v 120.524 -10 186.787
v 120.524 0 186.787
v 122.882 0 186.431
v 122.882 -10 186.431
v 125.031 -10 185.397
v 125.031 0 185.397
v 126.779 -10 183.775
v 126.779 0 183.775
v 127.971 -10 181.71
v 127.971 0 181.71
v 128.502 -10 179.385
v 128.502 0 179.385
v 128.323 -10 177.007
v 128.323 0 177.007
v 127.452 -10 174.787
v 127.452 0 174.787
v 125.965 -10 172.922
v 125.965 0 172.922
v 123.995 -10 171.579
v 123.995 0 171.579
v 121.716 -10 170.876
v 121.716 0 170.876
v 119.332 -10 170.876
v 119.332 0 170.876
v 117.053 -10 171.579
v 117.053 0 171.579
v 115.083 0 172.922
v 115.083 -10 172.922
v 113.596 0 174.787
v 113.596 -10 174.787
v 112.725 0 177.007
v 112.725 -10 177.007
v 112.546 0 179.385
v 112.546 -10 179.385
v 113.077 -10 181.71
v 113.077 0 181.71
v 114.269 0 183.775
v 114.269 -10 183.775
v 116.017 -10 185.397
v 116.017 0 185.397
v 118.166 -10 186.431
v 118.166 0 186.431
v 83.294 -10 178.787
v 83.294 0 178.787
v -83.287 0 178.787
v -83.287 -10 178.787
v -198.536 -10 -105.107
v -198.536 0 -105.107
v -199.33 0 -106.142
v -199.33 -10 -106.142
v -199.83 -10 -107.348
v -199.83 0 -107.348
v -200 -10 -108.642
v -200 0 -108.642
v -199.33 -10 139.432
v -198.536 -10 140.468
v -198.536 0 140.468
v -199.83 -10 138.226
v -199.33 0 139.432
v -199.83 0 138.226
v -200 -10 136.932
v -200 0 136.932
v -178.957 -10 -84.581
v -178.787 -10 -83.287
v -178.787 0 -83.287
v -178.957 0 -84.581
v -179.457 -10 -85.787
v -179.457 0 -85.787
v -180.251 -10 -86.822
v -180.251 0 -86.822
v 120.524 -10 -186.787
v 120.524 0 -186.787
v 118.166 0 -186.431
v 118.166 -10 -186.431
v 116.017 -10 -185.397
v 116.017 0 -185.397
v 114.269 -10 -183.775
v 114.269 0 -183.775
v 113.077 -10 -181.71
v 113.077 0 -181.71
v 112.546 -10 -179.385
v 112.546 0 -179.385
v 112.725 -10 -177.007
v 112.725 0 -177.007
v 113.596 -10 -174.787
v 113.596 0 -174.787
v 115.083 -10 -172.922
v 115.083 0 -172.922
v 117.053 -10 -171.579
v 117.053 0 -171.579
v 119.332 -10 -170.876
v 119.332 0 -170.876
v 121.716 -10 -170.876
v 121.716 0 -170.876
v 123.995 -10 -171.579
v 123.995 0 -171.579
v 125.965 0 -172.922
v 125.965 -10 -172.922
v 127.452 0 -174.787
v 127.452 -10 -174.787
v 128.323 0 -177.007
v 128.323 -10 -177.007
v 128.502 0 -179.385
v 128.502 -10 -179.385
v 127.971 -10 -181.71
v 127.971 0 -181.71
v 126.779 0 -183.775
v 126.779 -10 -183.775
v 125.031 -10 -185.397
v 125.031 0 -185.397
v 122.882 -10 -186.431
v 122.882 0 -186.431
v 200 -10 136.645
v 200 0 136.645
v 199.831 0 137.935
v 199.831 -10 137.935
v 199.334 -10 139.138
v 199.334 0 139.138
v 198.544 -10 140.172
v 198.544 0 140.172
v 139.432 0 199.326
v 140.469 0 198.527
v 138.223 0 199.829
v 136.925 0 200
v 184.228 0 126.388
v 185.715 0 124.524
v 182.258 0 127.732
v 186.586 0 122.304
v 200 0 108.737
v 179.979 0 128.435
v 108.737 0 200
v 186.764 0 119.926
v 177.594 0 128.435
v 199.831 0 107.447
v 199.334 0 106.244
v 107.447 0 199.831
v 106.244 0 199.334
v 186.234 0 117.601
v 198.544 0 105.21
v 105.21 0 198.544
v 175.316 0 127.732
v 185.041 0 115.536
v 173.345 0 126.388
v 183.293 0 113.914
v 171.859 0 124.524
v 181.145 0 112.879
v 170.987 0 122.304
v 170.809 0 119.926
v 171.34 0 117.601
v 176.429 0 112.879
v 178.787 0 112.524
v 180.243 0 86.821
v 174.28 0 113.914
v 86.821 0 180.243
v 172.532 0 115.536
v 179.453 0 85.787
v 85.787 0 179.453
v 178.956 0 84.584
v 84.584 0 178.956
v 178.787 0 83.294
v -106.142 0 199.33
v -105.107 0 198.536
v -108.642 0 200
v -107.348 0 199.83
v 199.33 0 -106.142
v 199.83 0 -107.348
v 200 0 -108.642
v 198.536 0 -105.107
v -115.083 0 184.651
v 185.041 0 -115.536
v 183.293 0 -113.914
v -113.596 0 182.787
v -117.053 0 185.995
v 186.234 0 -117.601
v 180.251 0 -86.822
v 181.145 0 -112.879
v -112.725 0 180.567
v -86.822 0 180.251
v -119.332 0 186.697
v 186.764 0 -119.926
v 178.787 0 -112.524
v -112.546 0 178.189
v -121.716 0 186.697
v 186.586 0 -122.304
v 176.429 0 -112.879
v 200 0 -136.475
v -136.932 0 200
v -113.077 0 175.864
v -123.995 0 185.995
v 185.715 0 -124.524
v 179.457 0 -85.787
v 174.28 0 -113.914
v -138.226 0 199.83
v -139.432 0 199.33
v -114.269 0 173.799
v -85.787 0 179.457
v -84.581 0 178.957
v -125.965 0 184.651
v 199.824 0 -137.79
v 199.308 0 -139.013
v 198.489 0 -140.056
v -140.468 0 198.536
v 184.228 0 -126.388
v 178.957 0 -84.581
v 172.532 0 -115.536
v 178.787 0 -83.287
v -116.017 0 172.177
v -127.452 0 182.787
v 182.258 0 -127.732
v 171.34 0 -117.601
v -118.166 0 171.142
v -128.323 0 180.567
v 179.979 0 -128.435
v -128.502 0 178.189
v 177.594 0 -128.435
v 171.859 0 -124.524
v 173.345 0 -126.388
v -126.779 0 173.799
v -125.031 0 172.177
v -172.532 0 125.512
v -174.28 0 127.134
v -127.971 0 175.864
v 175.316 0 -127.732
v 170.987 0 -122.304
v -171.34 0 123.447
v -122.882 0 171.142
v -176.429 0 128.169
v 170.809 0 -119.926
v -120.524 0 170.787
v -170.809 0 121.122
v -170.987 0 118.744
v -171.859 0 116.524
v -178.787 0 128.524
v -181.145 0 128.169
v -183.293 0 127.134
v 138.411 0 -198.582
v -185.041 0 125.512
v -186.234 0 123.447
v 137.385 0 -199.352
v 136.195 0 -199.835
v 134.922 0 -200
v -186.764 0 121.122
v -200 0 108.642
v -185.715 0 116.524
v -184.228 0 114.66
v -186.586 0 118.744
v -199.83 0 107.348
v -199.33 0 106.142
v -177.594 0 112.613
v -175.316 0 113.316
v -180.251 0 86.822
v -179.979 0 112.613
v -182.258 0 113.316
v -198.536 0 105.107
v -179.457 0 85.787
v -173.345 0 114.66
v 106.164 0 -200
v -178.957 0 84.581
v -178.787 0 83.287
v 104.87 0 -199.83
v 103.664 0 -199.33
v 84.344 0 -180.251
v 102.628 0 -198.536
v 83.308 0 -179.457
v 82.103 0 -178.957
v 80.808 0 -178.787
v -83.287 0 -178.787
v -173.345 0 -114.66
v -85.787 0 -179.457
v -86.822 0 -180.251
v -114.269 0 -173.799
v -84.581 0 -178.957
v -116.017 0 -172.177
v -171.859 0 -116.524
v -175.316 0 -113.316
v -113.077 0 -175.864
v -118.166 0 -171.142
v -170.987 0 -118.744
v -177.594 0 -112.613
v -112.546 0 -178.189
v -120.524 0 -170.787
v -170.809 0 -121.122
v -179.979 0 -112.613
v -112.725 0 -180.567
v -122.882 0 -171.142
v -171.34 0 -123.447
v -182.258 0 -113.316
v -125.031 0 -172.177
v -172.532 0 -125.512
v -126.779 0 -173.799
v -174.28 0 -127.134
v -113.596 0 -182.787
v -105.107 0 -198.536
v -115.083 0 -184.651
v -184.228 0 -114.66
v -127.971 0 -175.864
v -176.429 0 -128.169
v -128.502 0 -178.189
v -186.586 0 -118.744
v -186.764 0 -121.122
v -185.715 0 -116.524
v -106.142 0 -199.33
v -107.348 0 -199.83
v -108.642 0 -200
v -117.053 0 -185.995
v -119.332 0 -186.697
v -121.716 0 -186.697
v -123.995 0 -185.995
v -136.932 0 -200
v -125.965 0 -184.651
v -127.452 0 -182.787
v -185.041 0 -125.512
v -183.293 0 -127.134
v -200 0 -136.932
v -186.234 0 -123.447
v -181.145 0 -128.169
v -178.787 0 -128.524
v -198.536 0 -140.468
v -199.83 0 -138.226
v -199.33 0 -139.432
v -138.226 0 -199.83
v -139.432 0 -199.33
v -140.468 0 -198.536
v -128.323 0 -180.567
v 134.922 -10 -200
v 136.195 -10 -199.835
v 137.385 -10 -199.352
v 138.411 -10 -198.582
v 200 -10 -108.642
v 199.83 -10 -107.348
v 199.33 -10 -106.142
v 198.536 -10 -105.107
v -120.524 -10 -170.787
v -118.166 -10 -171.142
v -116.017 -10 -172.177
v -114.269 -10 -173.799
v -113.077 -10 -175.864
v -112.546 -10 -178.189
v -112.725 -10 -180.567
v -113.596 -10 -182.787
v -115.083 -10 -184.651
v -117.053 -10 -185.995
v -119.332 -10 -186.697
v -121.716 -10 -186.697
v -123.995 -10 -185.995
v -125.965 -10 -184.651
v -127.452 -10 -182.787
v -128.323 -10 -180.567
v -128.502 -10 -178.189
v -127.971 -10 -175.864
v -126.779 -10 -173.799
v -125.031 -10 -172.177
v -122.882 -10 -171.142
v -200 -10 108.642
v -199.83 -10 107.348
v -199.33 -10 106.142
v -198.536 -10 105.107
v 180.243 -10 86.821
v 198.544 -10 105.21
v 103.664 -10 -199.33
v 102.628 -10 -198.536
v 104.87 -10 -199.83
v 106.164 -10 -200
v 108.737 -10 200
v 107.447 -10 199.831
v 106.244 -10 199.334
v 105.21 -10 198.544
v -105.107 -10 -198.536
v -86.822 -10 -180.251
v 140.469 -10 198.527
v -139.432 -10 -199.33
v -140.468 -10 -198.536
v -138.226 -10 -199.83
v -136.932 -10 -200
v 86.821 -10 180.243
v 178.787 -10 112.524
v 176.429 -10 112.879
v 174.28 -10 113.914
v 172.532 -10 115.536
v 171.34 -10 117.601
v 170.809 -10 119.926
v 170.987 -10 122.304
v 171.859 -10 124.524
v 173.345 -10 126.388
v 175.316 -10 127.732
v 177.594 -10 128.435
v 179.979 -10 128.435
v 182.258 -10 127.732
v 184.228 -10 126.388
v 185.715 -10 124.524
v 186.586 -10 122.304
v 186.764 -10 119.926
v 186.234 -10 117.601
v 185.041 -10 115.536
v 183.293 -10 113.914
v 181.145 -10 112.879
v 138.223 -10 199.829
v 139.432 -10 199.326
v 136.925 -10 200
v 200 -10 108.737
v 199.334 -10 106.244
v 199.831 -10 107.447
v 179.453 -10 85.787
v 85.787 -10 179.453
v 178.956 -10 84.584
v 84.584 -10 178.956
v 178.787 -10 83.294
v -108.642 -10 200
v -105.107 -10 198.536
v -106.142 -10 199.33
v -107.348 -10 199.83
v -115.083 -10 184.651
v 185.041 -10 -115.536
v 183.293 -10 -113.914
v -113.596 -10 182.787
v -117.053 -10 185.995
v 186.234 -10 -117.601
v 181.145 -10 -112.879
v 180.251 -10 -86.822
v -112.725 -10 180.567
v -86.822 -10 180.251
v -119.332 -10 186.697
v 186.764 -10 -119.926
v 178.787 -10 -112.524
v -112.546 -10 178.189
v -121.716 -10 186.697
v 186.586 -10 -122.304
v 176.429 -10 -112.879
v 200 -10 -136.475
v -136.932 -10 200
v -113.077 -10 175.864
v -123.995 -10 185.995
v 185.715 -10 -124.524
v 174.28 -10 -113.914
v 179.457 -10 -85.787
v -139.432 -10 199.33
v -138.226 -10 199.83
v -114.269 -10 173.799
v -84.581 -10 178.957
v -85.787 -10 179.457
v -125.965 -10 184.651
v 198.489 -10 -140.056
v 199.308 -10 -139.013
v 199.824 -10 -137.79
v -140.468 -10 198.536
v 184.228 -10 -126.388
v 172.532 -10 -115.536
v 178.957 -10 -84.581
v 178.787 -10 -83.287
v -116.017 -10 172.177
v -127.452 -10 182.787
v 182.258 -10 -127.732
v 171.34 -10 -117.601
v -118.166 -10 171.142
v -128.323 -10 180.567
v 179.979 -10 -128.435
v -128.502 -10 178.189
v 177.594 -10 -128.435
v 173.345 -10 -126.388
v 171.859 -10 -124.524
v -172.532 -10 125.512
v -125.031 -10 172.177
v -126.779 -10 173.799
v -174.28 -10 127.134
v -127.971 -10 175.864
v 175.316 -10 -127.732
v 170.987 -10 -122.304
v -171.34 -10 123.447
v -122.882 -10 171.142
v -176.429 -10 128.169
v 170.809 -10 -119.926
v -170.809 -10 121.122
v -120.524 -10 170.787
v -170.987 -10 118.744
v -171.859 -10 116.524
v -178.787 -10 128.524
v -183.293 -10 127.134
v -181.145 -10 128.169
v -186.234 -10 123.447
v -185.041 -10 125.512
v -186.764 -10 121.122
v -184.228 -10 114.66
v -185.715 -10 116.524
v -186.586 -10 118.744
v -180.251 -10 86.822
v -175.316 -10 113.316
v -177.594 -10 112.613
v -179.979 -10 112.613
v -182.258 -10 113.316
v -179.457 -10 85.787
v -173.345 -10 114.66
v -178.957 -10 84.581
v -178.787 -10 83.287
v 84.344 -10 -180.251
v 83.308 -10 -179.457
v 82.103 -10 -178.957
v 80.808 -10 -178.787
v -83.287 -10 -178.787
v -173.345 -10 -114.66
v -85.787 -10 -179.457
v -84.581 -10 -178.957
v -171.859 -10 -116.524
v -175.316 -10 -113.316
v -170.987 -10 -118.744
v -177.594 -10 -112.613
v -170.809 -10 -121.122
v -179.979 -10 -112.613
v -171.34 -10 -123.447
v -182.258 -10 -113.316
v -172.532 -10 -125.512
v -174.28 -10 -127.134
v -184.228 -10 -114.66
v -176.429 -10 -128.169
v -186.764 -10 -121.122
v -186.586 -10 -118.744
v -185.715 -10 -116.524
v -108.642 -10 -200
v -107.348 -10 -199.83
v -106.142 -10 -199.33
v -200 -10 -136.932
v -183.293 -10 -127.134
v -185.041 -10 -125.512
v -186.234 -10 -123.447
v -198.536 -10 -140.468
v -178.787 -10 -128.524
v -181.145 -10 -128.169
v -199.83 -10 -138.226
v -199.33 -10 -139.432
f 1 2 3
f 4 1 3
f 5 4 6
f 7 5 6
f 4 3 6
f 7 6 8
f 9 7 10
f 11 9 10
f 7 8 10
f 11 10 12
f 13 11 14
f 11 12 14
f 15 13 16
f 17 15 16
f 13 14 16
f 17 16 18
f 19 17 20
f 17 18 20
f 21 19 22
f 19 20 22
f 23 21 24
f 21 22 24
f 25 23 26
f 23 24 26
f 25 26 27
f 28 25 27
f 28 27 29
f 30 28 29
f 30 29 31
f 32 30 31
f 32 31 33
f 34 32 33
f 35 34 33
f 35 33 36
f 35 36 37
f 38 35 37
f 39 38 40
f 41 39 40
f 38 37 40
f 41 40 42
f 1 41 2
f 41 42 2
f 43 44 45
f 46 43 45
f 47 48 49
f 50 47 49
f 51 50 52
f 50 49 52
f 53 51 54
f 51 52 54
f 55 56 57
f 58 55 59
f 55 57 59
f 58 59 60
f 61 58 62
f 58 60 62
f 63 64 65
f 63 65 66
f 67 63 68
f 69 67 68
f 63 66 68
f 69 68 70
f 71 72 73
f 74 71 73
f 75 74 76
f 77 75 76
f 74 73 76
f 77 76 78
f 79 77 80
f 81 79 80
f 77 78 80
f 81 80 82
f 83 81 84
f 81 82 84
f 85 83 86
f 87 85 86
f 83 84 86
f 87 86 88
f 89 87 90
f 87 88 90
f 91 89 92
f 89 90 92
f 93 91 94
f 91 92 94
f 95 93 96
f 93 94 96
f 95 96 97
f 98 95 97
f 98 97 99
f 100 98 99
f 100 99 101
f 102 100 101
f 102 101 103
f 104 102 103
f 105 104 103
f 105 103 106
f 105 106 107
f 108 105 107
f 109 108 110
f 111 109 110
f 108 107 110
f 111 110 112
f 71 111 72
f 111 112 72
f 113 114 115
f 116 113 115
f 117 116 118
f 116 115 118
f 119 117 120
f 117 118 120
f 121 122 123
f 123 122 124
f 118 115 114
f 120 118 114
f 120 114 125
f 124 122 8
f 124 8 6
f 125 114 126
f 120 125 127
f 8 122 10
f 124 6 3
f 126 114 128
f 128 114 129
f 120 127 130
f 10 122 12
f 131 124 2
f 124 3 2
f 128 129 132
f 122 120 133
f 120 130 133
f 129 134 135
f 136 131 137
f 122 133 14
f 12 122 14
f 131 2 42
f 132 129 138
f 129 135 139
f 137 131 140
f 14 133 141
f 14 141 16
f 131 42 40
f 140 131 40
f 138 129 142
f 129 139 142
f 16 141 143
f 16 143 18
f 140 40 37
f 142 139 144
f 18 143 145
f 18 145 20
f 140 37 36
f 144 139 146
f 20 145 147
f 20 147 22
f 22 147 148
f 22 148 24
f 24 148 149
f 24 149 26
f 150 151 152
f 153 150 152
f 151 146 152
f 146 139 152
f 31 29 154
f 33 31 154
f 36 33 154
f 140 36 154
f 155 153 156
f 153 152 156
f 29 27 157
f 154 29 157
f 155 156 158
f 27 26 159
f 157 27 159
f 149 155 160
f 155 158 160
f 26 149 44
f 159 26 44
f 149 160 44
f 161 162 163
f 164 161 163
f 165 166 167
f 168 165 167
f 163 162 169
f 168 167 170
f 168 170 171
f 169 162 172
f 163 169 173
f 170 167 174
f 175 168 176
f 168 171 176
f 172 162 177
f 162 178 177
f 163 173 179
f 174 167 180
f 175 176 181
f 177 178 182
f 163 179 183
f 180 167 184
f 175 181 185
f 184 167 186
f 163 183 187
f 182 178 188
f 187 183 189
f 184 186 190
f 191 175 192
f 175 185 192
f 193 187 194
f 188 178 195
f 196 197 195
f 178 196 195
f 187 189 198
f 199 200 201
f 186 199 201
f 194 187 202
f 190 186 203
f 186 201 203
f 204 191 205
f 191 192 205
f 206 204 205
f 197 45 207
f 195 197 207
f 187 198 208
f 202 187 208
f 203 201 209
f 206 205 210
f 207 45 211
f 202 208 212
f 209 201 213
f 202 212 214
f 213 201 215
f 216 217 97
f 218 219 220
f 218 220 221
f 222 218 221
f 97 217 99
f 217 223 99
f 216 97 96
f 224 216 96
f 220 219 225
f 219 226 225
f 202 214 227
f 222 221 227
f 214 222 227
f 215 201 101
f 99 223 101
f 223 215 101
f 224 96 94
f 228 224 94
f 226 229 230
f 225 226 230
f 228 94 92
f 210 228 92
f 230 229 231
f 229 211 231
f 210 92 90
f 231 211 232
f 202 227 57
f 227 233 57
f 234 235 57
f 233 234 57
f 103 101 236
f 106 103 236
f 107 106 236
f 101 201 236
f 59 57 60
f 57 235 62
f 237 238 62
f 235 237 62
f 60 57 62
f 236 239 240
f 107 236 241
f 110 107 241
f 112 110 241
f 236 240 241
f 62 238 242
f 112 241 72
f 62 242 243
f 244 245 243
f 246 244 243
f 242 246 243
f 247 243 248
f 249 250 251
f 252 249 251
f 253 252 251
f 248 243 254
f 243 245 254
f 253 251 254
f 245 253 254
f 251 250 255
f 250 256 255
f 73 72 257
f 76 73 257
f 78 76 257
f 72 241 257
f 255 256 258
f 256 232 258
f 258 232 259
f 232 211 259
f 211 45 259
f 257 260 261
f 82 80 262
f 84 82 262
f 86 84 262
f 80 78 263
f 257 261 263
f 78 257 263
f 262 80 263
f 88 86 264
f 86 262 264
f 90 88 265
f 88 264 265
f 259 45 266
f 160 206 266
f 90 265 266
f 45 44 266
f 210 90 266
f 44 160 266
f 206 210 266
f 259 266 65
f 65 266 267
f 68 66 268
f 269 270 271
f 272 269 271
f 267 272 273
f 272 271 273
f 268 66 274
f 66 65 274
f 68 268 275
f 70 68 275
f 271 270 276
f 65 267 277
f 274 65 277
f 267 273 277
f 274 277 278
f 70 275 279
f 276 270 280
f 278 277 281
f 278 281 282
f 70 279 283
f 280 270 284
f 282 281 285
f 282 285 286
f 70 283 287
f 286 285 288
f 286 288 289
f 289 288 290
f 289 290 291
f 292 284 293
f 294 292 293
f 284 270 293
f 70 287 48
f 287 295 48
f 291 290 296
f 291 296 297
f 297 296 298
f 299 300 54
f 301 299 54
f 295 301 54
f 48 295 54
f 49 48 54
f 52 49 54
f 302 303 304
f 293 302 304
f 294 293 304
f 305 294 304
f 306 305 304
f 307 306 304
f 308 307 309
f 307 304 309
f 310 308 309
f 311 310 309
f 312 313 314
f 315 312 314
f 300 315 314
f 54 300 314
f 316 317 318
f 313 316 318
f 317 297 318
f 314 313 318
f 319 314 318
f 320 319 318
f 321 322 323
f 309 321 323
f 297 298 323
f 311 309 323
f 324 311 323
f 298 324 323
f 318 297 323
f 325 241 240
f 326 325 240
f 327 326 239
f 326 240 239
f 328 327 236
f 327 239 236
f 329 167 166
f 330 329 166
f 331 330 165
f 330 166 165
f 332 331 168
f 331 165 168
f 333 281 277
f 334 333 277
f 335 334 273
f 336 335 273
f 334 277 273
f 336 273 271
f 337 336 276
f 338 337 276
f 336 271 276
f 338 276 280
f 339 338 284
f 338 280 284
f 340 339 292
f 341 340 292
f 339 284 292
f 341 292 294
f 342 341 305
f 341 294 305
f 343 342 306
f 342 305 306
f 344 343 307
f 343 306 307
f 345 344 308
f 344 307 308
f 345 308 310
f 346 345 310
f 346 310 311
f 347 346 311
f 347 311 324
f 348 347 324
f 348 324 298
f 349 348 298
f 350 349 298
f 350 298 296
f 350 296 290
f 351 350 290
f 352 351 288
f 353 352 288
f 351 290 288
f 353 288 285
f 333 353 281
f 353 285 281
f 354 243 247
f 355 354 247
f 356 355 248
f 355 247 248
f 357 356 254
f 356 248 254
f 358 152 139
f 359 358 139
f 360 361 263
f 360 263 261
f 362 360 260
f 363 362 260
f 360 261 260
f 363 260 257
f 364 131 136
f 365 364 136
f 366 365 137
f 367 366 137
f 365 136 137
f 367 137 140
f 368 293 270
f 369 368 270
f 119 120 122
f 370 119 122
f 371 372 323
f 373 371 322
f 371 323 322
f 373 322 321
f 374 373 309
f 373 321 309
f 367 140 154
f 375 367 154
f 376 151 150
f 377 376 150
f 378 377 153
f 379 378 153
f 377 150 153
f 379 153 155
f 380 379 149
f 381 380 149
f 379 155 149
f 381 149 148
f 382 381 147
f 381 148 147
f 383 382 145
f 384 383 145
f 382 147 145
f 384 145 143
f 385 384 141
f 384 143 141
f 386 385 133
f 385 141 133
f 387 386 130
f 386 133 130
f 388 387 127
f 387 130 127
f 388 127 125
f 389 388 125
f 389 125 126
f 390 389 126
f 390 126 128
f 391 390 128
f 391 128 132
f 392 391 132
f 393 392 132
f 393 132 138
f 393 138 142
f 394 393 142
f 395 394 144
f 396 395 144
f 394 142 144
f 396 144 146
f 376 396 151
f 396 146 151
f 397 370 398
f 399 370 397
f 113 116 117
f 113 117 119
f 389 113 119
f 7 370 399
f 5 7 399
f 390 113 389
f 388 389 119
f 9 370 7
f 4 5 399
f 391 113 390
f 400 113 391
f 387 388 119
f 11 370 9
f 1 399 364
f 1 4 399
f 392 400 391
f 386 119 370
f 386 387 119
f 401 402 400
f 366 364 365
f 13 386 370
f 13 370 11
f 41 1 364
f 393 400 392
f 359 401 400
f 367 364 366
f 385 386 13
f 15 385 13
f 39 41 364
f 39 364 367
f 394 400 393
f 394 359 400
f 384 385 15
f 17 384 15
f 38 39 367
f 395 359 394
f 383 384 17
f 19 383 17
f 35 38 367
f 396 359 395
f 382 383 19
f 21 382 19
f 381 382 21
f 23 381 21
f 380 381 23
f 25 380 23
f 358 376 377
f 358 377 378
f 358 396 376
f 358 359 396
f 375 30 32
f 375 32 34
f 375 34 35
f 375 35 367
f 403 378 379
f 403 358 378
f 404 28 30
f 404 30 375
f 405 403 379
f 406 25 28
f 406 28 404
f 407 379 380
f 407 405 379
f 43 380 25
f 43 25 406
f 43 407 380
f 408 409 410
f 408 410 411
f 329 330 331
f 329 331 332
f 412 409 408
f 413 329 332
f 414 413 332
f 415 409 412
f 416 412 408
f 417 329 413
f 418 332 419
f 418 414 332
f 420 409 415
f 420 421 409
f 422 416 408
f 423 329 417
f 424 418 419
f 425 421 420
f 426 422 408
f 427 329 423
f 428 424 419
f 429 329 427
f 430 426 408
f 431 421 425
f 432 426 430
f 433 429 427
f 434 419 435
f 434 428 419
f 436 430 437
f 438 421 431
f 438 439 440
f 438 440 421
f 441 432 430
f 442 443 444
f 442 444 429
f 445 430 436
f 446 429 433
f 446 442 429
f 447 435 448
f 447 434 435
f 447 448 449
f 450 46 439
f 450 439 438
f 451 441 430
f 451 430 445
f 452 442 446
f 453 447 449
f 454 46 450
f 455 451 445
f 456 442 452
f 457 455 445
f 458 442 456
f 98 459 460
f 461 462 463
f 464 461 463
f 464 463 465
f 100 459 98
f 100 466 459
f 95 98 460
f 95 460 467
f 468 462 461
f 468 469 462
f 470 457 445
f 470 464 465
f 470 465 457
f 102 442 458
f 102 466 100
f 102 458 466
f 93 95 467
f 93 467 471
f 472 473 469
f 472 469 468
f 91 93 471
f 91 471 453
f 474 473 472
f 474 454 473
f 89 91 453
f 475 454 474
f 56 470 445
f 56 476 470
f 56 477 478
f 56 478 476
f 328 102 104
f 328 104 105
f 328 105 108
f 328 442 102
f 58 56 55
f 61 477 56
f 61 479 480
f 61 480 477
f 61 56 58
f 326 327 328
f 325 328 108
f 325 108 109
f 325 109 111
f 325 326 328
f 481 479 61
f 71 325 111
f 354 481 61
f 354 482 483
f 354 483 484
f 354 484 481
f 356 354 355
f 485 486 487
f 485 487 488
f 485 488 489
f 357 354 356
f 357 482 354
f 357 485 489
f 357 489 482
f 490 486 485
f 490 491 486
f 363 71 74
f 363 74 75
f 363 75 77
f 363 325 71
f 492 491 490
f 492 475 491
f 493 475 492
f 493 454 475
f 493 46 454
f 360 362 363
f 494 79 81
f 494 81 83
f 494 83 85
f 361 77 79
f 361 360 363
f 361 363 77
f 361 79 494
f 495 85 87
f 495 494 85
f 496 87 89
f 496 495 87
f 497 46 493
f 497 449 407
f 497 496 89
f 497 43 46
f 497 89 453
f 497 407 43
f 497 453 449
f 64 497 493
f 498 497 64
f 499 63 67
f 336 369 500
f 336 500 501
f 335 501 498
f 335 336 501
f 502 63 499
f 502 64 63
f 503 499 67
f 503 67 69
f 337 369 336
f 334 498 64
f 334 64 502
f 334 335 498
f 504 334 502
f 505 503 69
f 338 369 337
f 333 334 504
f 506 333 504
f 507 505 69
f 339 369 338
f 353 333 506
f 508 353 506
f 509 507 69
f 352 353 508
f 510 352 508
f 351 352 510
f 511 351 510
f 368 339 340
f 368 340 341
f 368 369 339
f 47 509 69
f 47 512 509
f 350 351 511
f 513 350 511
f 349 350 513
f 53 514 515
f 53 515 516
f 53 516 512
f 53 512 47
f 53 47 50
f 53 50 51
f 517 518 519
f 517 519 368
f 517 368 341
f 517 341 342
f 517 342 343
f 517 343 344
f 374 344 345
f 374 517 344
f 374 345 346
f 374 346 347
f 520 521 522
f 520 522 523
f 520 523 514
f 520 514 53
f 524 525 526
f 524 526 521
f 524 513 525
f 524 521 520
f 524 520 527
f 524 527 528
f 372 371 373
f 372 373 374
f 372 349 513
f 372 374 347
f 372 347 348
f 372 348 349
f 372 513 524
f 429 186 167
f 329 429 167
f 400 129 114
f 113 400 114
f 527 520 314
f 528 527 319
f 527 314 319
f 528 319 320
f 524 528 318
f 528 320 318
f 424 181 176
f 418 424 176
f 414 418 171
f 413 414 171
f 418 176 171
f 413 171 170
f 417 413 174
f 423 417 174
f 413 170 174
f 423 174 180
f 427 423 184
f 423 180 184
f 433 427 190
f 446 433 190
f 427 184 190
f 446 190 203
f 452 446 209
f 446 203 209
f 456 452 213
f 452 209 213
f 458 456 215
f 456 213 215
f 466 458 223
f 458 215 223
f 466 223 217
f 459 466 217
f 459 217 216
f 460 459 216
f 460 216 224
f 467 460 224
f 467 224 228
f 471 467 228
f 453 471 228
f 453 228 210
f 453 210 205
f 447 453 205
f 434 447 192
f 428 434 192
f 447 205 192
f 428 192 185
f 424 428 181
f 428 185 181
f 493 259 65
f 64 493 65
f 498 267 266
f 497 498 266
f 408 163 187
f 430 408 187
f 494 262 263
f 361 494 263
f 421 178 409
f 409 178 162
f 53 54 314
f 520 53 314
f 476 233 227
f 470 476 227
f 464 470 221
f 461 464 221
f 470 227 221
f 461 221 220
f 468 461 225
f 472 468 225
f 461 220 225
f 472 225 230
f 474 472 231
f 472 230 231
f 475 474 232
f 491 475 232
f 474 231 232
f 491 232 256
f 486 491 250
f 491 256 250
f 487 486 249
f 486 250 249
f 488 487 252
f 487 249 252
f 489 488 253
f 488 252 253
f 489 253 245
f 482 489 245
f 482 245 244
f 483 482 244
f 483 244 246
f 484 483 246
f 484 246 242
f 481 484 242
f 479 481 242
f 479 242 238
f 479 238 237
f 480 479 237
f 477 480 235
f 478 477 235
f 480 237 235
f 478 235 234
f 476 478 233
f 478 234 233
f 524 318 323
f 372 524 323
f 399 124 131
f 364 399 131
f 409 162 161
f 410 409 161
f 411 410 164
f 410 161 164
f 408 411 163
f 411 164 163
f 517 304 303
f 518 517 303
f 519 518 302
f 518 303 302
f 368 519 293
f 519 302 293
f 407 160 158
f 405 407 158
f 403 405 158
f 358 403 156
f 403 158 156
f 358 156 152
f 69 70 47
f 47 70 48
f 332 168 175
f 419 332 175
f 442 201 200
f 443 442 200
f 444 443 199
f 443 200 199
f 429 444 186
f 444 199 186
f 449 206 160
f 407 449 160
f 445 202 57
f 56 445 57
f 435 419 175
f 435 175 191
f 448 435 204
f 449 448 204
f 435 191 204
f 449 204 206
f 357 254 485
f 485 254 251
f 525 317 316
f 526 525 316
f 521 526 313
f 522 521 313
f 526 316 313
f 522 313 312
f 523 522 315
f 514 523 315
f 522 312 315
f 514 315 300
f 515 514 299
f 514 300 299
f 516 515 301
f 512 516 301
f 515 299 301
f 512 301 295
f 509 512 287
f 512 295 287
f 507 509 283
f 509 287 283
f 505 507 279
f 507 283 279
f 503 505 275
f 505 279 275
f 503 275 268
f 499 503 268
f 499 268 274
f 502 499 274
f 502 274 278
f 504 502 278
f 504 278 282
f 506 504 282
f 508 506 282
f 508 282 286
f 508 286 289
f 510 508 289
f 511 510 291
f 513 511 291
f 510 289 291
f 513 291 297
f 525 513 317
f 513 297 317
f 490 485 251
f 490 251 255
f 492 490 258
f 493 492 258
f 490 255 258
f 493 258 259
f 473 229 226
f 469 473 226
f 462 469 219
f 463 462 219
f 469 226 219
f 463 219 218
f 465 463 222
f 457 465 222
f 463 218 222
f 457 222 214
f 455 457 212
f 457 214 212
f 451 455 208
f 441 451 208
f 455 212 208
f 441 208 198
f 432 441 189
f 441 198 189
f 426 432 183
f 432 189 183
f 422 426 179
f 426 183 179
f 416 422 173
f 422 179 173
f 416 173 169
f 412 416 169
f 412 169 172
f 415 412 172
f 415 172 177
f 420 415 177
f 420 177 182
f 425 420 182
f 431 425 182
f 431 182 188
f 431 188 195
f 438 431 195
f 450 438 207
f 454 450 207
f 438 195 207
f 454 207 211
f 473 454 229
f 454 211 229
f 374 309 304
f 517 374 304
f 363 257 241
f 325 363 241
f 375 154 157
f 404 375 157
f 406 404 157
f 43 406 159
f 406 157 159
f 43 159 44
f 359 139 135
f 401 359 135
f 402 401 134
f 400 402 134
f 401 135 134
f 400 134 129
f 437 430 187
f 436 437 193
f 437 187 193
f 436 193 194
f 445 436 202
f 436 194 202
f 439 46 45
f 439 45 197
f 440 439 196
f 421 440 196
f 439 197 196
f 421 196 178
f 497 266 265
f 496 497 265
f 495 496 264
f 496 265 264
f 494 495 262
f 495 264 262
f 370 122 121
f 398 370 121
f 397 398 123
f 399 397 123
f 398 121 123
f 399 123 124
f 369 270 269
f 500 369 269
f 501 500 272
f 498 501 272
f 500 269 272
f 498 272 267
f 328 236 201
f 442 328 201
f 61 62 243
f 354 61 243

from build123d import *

# Parameters (mm, degrees)
ESQUISSE1_R        = 8
BOSS_EXTRU_3_DEPTH = 10


with BuildPart() as part:
    # Esquisse1 → Boss.-Extru.3 (new body)
    with BuildSketch(Plane(origin=(0, 0, 0), x_dir=(1, 0, 0), z_dir=(0, 1, 0))):
        with BuildLine():
            Line((-198.535533906, 140.467889787), (-140.467889787, 198.535533906))
            ThreePointArc((-140.467889787, 198.535533906), (-138.845773043, 199.619397663), (-136.932355881, 200))
            Line((-136.932355881, 200), (-108.642059072, 200))
            ThreePointArc((-108.642059072, 200), (-106.728641911, 199.619397663), (-105.106525166, 198.535533906))
            Line((-105.106525166, 198.535533906), (-86.822253919, 180.251262659))
            ThreePointArc((-86.822253919, 180.251262659), (-85.200137175, 179.167398902), (-83.286720013, 178.786796564))
            Line((-83.286720013, 178.786796564), (80.808477816, 178.786796564))
            ThreePointArc((80.808477816, 178.786796564), (82.721894978, 179.167398902), (84.344011722, 180.251262659))
            Line((84.344011722, 180.251262659), (102.628282969, 198.535533906))
            ThreePointArc((102.628282969, 198.535533906), (104.250399713, 199.619397663), (106.163816875, 200))
            Line((106.163816875, 200), (134.922487193, 200))
            ThreePointArc((134.922487193, 200), (136.805633434, 199.631820402), (138.411445264, 198.581504094))
            Line((138.411445264, 198.581504094), (198.488958072, 140.056393487))
            ThreePointArc((198.488958072, 140.056393487), (199.606777092, 138.418495531), (200, 136.474889393))
            Line((200, 136.474889393), (200, 108.642059072))
            ThreePointArc((200, 108.642059072), (199.619397663, 106.728641911), (198.535533906, 105.106525167))
            Line((198.535533906, 105.106525167), (180.251262658, 86.822253919))
            ThreePointArc((180.251262658, 86.822253919), (179.167398902, 85.200137175), (178.786796564, 83.286720013))
            Line((178.786796564, 83.286720013), (178.786796564, -83.293766644))
            ThreePointArc((178.786796564, -83.293766644), (179.165099385, -85.201622818), (180.242762637, -86.820780044))
            Line((180.242762637, -86.820780044), (198.544033927, -105.210368915))
            ThreePointArc((198.544033927, -105.210368915), (199.621697179, -106.82952614), (200, -108.737382314))
            Line((200, -108.737382314), (200, -136.645047547))
            ThreePointArc((200, -136.645047547), (199.621697179, -138.552903722), (198.544033927, -140.172060947))
            Line((198.544033927, -140.172060947), (140.469336148, -198.5270134))
            ThreePointArc((140.469336148, -198.5270134), (138.844277599, -199.617091455), (136.925302221, -200))
            Line((136.925302221, -200), (108.737382314, -200))
            ThreePointArc((108.737382314, -200), (106.82952614, -199.621697179), (105.210368915, -198.544033927))
            Line((105.210368915, -198.544033927), (86.820780044, -180.242762637))
            ThreePointArc((86.820780044, -180.242762637), (85.201622818, -179.165099385), (83.293766644, -178.786796564))
            Line((83.293766644, -178.786796564), (-83.286720013, -178.786796564))
            ThreePointArc((-83.286720013, -178.786796564), (-85.200137175, -179.167398902), (-86.822253919, -180.251262658))
            Line((-86.822253919, -180.251262658), (-105.106525166, -198.535533906))
            ThreePointArc((-105.106525166, -198.535533906), (-106.728641911, -199.619397663), (-108.642059072, -200))
            Line((-108.642059072, -200), (-136.932355881, -200))
            ThreePointArc((-136.932355881, -200), (-138.845773043, -199.619397663), (-140.467889787, -198.535533906))
            Line((-140.467889787, -198.535533906), (-198.535533906, -140.467889787))
            ThreePointArc((-198.535533906, -140.467889787), (-199.619397663, -138.845773043), (-200, -136.932355881))
            Line((-200, -136.932355881), (-200, -108.642059072))
            ThreePointArc((-200, -108.642059072), (-199.619397663, -106.728641911), (-198.535533906, -105.106525166))
            Line((-198.535533906, -105.106525166), (-180.251262658, -86.822253919))
            ThreePointArc((-180.251262658, -86.822253919), (-179.167398902, -85.200137175), (-178.786796564, -83.286720013))
            Line((-178.786796564, -83.286720013), (-178.786796564, 83.286720013))
            ThreePointArc((-178.786796564, 83.286720013), (-179.167398902, 85.200137175), (-180.251262658, 86.822253919))
            Line((-180.251262658, 86.822253919), (-198.535533906, 105.106525166))
            ThreePointArc((-198.535533906, 105.106525166), (-199.619397663, 106.728641911), (-200, 108.642059072))
            Line((-200, 108.642059072), (-200, 136.932355881))
            ThreePointArc((-200, 136.932355881), (-199.619397663, 138.845773043), (-198.535533906, 140.467889787))
        make_face()
        with Locations(Location((120.524036122, -178.786796564, 0), (0, 0, 270))):  # turned: the seam where the file's is
            Circle(ESQUISSE1_R, mode=Mode.SUBTRACT)
        with Locations(Location((-178.786796564, -120.524036122, 0), (0, 0, 270))):  # turned: the seam where the file's is
            Circle(ESQUISSE1_R, mode=Mode.SUBTRACT)
        with Locations(Location((-120.524036122, 178.786796564, 0), (0, 0, 270))):  # turned: the seam where the file's is
            Circle(ESQUISSE1_R, mode=Mode.SUBTRACT)
        with Locations(Location((178.786796564, 120.524036122, 0), (0, 0, 270))):  # turned: the seam where the file's is
            Circle(ESQUISSE1_R, mode=Mode.SUBTRACT)
        with Locations(Location((-178.786796564, 120.524036122, 0), (0, 0, 90))):  # turned: the seam where the file's is
            Circle(ESQUISSE1_R, mode=Mode.SUBTRACT)
        with Locations(Location((120.524036122, 178.786796564, 0), (0, 0, 90))):  # turned: the seam where the file's is
            Circle(ESQUISSE1_R, mode=Mode.SUBTRACT)
        with Locations(Location((178.786796564, -120.524036122, 0), (0, 0, 90))):  # turned: the seam where the file's is
            Circle(ESQUISSE1_R, mode=Mode.SUBTRACT)
        with Locations(Location((-120.524036122, -178.786796564, 0), (0, 0, 90))):  # turned: the seam where the file's is
            Circle(ESQUISSE1_R, mode=Mode.SUBTRACT)
    extrude(amount=-BOSS_EXTRU_3_DEPTH)


solid = part.part
